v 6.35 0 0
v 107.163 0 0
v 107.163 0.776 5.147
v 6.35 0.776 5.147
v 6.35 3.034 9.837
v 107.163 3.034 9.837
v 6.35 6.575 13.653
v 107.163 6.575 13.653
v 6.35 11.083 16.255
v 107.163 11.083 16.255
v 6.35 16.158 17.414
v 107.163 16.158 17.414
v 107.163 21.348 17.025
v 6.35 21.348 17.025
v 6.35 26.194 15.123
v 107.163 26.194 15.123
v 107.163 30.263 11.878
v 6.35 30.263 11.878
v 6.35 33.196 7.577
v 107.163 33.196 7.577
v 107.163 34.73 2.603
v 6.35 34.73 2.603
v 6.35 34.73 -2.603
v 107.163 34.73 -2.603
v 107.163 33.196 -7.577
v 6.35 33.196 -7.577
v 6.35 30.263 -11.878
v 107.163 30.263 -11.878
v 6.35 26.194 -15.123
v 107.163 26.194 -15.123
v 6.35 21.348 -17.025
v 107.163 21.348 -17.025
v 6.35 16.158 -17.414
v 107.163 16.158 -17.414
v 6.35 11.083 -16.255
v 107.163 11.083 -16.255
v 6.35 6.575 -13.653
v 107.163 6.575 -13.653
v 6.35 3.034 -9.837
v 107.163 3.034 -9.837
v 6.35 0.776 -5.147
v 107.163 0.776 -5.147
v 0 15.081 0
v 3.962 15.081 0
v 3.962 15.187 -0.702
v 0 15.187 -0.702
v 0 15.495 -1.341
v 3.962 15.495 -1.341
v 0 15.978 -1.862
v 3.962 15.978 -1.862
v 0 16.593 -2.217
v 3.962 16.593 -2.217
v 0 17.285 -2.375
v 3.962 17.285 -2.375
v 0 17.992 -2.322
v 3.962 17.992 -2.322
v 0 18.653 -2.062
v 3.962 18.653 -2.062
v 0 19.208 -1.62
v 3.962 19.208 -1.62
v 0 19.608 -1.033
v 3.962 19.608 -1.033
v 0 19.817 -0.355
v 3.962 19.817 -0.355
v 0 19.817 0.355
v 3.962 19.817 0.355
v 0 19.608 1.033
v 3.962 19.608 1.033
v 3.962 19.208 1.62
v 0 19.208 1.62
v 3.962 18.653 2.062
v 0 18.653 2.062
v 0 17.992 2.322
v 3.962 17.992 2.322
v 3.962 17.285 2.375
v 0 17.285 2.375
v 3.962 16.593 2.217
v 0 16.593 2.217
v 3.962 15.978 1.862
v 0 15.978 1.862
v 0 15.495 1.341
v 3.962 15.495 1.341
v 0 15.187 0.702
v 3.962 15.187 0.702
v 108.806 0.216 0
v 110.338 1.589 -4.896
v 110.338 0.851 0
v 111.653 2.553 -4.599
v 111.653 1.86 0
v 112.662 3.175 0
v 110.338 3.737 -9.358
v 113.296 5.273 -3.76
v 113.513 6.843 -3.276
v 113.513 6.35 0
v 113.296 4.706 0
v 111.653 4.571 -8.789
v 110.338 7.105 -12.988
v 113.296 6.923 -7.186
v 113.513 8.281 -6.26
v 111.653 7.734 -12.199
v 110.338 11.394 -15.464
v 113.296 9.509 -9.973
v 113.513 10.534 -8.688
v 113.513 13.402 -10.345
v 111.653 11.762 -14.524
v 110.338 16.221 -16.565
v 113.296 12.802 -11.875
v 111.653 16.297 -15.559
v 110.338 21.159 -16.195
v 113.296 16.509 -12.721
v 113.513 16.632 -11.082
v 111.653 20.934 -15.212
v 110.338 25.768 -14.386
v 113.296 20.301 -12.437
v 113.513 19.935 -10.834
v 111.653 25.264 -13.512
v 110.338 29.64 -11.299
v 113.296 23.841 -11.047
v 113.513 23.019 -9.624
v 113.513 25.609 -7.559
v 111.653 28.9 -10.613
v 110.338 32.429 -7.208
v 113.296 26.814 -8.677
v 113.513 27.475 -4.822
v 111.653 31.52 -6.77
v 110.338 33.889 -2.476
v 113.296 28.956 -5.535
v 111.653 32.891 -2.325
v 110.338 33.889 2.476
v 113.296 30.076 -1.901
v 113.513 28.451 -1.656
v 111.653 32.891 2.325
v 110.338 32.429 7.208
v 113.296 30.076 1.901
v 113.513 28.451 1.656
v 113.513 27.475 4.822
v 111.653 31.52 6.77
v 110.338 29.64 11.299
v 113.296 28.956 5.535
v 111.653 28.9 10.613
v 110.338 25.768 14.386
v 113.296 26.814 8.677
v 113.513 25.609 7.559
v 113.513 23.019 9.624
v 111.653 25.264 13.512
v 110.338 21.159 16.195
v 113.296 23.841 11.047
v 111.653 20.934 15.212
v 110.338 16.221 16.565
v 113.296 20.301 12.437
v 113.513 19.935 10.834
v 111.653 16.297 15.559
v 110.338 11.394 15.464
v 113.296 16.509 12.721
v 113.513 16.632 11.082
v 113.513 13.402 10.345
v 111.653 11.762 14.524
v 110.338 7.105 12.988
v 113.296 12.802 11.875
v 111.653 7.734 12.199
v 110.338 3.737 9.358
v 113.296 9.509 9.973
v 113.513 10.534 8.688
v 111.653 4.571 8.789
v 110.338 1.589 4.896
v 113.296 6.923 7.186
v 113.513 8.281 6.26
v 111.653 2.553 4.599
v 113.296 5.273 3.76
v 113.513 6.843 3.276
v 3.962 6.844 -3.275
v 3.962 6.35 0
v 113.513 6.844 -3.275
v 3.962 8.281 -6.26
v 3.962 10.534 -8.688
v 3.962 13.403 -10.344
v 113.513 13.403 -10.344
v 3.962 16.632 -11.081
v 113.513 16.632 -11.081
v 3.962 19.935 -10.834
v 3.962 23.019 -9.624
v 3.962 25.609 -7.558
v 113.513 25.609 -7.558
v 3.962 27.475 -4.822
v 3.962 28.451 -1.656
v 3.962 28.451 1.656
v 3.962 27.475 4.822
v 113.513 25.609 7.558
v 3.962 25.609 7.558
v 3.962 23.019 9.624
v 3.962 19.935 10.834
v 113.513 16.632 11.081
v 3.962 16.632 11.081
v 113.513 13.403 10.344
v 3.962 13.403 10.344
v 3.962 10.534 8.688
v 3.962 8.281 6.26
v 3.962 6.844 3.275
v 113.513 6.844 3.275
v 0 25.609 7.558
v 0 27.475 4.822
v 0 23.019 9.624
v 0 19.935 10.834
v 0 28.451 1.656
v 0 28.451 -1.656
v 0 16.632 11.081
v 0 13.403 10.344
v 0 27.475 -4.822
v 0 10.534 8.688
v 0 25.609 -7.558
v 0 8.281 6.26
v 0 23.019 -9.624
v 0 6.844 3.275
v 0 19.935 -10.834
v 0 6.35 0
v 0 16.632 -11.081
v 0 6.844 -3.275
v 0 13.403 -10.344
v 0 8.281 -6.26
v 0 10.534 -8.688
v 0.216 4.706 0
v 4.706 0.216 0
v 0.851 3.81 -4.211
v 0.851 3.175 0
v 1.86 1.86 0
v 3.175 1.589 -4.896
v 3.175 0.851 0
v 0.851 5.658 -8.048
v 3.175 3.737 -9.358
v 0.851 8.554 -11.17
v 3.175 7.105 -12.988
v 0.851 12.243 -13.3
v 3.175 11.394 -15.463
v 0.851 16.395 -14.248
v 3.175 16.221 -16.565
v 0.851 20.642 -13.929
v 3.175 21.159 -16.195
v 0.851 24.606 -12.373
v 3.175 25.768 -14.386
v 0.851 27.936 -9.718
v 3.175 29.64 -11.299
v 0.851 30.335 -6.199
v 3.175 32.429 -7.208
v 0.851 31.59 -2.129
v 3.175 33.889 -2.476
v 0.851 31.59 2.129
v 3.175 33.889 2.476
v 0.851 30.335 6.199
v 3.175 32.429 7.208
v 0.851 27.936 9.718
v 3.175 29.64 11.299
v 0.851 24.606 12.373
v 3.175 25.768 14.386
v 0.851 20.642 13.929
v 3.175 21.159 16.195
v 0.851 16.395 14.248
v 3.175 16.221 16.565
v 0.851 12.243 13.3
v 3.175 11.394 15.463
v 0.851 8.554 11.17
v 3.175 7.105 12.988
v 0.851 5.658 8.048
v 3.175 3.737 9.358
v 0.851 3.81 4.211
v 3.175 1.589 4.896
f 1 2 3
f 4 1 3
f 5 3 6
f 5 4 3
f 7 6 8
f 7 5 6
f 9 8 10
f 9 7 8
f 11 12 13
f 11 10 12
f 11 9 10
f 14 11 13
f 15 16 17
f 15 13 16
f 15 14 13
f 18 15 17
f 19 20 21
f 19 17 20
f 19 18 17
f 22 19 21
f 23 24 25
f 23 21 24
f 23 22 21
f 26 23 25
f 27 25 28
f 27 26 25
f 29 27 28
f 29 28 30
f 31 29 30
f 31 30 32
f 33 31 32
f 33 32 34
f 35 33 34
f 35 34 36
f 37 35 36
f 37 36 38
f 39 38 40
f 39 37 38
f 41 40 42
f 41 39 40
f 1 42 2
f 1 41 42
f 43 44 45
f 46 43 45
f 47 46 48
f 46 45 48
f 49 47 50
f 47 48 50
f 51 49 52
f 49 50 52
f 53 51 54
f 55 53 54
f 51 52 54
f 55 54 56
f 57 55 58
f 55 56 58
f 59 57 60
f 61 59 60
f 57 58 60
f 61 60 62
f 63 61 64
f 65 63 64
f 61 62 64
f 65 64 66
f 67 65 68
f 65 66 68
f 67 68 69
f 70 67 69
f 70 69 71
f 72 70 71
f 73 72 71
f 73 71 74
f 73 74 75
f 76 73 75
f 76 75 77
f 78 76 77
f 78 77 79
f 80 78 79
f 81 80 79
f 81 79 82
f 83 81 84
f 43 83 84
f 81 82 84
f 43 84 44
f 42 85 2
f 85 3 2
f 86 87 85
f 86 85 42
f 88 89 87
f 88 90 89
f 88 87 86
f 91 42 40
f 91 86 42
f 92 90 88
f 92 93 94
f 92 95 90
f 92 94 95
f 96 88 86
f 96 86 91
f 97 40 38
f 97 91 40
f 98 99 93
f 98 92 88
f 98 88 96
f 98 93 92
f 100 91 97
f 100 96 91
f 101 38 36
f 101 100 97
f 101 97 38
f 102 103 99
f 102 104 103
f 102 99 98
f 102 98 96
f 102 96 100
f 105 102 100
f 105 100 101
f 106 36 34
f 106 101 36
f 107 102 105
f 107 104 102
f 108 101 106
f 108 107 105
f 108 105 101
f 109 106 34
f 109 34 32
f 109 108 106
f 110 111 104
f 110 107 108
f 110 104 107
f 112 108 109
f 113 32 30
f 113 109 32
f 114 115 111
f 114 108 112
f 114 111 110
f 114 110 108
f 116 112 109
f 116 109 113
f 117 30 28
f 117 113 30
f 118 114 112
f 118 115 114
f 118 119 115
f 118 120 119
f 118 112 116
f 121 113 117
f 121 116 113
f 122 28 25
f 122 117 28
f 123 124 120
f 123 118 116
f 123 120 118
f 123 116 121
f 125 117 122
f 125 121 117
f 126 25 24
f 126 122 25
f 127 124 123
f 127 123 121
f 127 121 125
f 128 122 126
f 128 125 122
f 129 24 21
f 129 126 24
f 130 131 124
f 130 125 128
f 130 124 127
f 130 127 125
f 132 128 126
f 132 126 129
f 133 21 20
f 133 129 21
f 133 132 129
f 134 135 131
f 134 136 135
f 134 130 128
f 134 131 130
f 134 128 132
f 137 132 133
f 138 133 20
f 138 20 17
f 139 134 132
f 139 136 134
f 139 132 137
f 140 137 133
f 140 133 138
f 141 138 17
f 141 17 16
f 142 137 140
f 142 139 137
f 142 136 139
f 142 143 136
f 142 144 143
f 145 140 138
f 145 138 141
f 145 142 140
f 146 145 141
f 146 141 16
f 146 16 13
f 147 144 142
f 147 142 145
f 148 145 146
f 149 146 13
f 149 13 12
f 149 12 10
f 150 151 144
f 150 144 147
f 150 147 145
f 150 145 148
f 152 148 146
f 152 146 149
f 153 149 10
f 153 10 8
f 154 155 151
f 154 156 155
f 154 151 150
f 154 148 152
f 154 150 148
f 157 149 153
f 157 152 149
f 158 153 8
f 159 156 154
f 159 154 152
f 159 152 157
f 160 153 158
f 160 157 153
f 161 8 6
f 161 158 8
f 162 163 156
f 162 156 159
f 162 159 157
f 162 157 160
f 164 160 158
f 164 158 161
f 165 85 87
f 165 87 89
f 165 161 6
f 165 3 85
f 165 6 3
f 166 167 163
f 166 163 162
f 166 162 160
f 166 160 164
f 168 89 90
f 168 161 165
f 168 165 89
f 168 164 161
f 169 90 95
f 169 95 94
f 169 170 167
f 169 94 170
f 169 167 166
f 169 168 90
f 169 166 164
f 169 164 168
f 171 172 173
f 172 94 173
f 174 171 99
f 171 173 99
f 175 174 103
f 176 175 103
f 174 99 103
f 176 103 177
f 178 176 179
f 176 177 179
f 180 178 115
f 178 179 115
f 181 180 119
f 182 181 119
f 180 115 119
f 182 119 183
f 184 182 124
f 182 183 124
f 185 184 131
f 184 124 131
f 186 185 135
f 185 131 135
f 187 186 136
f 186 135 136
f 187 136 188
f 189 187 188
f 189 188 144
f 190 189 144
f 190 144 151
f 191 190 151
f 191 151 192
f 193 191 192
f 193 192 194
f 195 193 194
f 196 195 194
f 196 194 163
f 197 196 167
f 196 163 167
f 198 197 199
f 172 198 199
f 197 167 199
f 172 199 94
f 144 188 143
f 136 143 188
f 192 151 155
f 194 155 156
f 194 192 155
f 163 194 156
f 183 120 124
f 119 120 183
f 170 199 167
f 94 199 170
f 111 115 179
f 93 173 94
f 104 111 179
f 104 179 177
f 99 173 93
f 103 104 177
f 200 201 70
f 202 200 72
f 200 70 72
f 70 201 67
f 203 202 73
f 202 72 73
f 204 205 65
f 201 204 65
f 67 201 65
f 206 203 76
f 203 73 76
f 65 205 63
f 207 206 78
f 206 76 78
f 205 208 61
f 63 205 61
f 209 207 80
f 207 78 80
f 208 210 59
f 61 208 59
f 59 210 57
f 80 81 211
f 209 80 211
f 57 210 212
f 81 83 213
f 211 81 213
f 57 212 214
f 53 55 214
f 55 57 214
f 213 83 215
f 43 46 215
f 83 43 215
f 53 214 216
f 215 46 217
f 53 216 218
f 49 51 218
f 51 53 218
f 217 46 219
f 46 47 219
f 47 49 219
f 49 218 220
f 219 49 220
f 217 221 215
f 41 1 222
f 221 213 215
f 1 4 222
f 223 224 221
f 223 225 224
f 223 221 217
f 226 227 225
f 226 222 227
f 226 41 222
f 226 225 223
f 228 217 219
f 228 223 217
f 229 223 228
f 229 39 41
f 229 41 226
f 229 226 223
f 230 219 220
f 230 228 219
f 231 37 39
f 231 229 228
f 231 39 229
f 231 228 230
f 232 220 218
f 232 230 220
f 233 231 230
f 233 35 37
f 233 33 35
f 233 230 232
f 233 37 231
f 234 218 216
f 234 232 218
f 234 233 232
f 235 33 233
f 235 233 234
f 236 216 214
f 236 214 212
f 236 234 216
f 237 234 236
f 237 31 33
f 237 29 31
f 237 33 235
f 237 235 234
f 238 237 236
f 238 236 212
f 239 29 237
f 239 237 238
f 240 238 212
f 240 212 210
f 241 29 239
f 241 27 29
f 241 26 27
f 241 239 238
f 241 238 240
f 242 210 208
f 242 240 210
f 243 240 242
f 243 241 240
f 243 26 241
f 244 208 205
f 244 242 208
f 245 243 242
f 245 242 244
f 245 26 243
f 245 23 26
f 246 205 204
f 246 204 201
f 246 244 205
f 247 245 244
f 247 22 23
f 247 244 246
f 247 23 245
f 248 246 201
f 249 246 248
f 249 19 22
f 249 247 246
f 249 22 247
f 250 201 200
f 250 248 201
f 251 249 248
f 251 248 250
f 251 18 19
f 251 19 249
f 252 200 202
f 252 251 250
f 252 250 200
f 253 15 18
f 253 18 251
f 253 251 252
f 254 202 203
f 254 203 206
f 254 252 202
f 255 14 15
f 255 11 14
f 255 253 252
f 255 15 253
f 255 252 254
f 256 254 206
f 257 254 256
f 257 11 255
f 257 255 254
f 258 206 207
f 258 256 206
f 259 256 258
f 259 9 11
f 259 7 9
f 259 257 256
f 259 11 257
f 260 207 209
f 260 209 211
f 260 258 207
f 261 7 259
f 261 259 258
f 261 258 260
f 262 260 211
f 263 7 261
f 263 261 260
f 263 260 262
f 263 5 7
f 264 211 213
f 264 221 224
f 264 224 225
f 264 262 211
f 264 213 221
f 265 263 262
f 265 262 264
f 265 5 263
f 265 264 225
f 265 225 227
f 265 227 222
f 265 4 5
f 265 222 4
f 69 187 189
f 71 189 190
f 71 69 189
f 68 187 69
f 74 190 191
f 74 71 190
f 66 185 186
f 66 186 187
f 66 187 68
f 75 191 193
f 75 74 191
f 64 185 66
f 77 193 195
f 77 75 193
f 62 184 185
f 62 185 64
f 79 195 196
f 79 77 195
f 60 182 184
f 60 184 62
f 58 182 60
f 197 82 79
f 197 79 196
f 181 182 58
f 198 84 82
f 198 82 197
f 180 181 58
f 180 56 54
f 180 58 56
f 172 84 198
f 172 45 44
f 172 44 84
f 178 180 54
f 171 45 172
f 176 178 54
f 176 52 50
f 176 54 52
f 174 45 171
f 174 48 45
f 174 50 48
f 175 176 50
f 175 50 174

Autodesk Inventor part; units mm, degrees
ref_plane "YZ Plane" through (0, 0, 0) normal (1, 0, 0) x (0, 1, 0)
ref_plane "XZ Plane" through (0, 0, 0) normal (0, 1, 0) x (-1, 0, 0)
ref_plane "XY Plane" through (0, 0, 0) normal (0, 0, 1) x (1, 0, 0)
sketch "Sketch1" plane through (0, 0, 0) normal (0, 0, 1) x (1, 0, 0)
  line L0 (0, 0) -> (0, 15.0812)
  line L1 (0, 15.0812) -> (3.9624, 15.0812)
  line L2 (3.9624, 15.0812) -> (3.9624, 6.35)
  line L3 (3.9624, 6.35) -> (113.5126, 6.35)
  line L4 (113.5126, 6.35) -> (113.5126, 0)
  line L5 (113.5126, 0) -> (0, 0)
  line L6 (0, 17.4625) -> (113.5126, 17.4625)
  dimension "d0" = 15.0813
  dimension "d1" = 8.7312
  dimension "d2" = 6.35
  dimension "d3" = 113.5126
  dimension "d4" = 3.9624
  dimension "d5" = 113.5126
  dimension "d6" = 2.3813
revolve "Revolution1" add sketch "Sketch1" angle 360 about axis through (0, 17.4625, 0) along (1, 0, 0)
fillet "Fillet1" radius 6.35 1 edges at (0, 34.925, 0)
fillet "Fillet2" radius 6.35 1 edges at (113.5126, 34.925, 0)
properties part number "RubberHandleSleeveDE"
